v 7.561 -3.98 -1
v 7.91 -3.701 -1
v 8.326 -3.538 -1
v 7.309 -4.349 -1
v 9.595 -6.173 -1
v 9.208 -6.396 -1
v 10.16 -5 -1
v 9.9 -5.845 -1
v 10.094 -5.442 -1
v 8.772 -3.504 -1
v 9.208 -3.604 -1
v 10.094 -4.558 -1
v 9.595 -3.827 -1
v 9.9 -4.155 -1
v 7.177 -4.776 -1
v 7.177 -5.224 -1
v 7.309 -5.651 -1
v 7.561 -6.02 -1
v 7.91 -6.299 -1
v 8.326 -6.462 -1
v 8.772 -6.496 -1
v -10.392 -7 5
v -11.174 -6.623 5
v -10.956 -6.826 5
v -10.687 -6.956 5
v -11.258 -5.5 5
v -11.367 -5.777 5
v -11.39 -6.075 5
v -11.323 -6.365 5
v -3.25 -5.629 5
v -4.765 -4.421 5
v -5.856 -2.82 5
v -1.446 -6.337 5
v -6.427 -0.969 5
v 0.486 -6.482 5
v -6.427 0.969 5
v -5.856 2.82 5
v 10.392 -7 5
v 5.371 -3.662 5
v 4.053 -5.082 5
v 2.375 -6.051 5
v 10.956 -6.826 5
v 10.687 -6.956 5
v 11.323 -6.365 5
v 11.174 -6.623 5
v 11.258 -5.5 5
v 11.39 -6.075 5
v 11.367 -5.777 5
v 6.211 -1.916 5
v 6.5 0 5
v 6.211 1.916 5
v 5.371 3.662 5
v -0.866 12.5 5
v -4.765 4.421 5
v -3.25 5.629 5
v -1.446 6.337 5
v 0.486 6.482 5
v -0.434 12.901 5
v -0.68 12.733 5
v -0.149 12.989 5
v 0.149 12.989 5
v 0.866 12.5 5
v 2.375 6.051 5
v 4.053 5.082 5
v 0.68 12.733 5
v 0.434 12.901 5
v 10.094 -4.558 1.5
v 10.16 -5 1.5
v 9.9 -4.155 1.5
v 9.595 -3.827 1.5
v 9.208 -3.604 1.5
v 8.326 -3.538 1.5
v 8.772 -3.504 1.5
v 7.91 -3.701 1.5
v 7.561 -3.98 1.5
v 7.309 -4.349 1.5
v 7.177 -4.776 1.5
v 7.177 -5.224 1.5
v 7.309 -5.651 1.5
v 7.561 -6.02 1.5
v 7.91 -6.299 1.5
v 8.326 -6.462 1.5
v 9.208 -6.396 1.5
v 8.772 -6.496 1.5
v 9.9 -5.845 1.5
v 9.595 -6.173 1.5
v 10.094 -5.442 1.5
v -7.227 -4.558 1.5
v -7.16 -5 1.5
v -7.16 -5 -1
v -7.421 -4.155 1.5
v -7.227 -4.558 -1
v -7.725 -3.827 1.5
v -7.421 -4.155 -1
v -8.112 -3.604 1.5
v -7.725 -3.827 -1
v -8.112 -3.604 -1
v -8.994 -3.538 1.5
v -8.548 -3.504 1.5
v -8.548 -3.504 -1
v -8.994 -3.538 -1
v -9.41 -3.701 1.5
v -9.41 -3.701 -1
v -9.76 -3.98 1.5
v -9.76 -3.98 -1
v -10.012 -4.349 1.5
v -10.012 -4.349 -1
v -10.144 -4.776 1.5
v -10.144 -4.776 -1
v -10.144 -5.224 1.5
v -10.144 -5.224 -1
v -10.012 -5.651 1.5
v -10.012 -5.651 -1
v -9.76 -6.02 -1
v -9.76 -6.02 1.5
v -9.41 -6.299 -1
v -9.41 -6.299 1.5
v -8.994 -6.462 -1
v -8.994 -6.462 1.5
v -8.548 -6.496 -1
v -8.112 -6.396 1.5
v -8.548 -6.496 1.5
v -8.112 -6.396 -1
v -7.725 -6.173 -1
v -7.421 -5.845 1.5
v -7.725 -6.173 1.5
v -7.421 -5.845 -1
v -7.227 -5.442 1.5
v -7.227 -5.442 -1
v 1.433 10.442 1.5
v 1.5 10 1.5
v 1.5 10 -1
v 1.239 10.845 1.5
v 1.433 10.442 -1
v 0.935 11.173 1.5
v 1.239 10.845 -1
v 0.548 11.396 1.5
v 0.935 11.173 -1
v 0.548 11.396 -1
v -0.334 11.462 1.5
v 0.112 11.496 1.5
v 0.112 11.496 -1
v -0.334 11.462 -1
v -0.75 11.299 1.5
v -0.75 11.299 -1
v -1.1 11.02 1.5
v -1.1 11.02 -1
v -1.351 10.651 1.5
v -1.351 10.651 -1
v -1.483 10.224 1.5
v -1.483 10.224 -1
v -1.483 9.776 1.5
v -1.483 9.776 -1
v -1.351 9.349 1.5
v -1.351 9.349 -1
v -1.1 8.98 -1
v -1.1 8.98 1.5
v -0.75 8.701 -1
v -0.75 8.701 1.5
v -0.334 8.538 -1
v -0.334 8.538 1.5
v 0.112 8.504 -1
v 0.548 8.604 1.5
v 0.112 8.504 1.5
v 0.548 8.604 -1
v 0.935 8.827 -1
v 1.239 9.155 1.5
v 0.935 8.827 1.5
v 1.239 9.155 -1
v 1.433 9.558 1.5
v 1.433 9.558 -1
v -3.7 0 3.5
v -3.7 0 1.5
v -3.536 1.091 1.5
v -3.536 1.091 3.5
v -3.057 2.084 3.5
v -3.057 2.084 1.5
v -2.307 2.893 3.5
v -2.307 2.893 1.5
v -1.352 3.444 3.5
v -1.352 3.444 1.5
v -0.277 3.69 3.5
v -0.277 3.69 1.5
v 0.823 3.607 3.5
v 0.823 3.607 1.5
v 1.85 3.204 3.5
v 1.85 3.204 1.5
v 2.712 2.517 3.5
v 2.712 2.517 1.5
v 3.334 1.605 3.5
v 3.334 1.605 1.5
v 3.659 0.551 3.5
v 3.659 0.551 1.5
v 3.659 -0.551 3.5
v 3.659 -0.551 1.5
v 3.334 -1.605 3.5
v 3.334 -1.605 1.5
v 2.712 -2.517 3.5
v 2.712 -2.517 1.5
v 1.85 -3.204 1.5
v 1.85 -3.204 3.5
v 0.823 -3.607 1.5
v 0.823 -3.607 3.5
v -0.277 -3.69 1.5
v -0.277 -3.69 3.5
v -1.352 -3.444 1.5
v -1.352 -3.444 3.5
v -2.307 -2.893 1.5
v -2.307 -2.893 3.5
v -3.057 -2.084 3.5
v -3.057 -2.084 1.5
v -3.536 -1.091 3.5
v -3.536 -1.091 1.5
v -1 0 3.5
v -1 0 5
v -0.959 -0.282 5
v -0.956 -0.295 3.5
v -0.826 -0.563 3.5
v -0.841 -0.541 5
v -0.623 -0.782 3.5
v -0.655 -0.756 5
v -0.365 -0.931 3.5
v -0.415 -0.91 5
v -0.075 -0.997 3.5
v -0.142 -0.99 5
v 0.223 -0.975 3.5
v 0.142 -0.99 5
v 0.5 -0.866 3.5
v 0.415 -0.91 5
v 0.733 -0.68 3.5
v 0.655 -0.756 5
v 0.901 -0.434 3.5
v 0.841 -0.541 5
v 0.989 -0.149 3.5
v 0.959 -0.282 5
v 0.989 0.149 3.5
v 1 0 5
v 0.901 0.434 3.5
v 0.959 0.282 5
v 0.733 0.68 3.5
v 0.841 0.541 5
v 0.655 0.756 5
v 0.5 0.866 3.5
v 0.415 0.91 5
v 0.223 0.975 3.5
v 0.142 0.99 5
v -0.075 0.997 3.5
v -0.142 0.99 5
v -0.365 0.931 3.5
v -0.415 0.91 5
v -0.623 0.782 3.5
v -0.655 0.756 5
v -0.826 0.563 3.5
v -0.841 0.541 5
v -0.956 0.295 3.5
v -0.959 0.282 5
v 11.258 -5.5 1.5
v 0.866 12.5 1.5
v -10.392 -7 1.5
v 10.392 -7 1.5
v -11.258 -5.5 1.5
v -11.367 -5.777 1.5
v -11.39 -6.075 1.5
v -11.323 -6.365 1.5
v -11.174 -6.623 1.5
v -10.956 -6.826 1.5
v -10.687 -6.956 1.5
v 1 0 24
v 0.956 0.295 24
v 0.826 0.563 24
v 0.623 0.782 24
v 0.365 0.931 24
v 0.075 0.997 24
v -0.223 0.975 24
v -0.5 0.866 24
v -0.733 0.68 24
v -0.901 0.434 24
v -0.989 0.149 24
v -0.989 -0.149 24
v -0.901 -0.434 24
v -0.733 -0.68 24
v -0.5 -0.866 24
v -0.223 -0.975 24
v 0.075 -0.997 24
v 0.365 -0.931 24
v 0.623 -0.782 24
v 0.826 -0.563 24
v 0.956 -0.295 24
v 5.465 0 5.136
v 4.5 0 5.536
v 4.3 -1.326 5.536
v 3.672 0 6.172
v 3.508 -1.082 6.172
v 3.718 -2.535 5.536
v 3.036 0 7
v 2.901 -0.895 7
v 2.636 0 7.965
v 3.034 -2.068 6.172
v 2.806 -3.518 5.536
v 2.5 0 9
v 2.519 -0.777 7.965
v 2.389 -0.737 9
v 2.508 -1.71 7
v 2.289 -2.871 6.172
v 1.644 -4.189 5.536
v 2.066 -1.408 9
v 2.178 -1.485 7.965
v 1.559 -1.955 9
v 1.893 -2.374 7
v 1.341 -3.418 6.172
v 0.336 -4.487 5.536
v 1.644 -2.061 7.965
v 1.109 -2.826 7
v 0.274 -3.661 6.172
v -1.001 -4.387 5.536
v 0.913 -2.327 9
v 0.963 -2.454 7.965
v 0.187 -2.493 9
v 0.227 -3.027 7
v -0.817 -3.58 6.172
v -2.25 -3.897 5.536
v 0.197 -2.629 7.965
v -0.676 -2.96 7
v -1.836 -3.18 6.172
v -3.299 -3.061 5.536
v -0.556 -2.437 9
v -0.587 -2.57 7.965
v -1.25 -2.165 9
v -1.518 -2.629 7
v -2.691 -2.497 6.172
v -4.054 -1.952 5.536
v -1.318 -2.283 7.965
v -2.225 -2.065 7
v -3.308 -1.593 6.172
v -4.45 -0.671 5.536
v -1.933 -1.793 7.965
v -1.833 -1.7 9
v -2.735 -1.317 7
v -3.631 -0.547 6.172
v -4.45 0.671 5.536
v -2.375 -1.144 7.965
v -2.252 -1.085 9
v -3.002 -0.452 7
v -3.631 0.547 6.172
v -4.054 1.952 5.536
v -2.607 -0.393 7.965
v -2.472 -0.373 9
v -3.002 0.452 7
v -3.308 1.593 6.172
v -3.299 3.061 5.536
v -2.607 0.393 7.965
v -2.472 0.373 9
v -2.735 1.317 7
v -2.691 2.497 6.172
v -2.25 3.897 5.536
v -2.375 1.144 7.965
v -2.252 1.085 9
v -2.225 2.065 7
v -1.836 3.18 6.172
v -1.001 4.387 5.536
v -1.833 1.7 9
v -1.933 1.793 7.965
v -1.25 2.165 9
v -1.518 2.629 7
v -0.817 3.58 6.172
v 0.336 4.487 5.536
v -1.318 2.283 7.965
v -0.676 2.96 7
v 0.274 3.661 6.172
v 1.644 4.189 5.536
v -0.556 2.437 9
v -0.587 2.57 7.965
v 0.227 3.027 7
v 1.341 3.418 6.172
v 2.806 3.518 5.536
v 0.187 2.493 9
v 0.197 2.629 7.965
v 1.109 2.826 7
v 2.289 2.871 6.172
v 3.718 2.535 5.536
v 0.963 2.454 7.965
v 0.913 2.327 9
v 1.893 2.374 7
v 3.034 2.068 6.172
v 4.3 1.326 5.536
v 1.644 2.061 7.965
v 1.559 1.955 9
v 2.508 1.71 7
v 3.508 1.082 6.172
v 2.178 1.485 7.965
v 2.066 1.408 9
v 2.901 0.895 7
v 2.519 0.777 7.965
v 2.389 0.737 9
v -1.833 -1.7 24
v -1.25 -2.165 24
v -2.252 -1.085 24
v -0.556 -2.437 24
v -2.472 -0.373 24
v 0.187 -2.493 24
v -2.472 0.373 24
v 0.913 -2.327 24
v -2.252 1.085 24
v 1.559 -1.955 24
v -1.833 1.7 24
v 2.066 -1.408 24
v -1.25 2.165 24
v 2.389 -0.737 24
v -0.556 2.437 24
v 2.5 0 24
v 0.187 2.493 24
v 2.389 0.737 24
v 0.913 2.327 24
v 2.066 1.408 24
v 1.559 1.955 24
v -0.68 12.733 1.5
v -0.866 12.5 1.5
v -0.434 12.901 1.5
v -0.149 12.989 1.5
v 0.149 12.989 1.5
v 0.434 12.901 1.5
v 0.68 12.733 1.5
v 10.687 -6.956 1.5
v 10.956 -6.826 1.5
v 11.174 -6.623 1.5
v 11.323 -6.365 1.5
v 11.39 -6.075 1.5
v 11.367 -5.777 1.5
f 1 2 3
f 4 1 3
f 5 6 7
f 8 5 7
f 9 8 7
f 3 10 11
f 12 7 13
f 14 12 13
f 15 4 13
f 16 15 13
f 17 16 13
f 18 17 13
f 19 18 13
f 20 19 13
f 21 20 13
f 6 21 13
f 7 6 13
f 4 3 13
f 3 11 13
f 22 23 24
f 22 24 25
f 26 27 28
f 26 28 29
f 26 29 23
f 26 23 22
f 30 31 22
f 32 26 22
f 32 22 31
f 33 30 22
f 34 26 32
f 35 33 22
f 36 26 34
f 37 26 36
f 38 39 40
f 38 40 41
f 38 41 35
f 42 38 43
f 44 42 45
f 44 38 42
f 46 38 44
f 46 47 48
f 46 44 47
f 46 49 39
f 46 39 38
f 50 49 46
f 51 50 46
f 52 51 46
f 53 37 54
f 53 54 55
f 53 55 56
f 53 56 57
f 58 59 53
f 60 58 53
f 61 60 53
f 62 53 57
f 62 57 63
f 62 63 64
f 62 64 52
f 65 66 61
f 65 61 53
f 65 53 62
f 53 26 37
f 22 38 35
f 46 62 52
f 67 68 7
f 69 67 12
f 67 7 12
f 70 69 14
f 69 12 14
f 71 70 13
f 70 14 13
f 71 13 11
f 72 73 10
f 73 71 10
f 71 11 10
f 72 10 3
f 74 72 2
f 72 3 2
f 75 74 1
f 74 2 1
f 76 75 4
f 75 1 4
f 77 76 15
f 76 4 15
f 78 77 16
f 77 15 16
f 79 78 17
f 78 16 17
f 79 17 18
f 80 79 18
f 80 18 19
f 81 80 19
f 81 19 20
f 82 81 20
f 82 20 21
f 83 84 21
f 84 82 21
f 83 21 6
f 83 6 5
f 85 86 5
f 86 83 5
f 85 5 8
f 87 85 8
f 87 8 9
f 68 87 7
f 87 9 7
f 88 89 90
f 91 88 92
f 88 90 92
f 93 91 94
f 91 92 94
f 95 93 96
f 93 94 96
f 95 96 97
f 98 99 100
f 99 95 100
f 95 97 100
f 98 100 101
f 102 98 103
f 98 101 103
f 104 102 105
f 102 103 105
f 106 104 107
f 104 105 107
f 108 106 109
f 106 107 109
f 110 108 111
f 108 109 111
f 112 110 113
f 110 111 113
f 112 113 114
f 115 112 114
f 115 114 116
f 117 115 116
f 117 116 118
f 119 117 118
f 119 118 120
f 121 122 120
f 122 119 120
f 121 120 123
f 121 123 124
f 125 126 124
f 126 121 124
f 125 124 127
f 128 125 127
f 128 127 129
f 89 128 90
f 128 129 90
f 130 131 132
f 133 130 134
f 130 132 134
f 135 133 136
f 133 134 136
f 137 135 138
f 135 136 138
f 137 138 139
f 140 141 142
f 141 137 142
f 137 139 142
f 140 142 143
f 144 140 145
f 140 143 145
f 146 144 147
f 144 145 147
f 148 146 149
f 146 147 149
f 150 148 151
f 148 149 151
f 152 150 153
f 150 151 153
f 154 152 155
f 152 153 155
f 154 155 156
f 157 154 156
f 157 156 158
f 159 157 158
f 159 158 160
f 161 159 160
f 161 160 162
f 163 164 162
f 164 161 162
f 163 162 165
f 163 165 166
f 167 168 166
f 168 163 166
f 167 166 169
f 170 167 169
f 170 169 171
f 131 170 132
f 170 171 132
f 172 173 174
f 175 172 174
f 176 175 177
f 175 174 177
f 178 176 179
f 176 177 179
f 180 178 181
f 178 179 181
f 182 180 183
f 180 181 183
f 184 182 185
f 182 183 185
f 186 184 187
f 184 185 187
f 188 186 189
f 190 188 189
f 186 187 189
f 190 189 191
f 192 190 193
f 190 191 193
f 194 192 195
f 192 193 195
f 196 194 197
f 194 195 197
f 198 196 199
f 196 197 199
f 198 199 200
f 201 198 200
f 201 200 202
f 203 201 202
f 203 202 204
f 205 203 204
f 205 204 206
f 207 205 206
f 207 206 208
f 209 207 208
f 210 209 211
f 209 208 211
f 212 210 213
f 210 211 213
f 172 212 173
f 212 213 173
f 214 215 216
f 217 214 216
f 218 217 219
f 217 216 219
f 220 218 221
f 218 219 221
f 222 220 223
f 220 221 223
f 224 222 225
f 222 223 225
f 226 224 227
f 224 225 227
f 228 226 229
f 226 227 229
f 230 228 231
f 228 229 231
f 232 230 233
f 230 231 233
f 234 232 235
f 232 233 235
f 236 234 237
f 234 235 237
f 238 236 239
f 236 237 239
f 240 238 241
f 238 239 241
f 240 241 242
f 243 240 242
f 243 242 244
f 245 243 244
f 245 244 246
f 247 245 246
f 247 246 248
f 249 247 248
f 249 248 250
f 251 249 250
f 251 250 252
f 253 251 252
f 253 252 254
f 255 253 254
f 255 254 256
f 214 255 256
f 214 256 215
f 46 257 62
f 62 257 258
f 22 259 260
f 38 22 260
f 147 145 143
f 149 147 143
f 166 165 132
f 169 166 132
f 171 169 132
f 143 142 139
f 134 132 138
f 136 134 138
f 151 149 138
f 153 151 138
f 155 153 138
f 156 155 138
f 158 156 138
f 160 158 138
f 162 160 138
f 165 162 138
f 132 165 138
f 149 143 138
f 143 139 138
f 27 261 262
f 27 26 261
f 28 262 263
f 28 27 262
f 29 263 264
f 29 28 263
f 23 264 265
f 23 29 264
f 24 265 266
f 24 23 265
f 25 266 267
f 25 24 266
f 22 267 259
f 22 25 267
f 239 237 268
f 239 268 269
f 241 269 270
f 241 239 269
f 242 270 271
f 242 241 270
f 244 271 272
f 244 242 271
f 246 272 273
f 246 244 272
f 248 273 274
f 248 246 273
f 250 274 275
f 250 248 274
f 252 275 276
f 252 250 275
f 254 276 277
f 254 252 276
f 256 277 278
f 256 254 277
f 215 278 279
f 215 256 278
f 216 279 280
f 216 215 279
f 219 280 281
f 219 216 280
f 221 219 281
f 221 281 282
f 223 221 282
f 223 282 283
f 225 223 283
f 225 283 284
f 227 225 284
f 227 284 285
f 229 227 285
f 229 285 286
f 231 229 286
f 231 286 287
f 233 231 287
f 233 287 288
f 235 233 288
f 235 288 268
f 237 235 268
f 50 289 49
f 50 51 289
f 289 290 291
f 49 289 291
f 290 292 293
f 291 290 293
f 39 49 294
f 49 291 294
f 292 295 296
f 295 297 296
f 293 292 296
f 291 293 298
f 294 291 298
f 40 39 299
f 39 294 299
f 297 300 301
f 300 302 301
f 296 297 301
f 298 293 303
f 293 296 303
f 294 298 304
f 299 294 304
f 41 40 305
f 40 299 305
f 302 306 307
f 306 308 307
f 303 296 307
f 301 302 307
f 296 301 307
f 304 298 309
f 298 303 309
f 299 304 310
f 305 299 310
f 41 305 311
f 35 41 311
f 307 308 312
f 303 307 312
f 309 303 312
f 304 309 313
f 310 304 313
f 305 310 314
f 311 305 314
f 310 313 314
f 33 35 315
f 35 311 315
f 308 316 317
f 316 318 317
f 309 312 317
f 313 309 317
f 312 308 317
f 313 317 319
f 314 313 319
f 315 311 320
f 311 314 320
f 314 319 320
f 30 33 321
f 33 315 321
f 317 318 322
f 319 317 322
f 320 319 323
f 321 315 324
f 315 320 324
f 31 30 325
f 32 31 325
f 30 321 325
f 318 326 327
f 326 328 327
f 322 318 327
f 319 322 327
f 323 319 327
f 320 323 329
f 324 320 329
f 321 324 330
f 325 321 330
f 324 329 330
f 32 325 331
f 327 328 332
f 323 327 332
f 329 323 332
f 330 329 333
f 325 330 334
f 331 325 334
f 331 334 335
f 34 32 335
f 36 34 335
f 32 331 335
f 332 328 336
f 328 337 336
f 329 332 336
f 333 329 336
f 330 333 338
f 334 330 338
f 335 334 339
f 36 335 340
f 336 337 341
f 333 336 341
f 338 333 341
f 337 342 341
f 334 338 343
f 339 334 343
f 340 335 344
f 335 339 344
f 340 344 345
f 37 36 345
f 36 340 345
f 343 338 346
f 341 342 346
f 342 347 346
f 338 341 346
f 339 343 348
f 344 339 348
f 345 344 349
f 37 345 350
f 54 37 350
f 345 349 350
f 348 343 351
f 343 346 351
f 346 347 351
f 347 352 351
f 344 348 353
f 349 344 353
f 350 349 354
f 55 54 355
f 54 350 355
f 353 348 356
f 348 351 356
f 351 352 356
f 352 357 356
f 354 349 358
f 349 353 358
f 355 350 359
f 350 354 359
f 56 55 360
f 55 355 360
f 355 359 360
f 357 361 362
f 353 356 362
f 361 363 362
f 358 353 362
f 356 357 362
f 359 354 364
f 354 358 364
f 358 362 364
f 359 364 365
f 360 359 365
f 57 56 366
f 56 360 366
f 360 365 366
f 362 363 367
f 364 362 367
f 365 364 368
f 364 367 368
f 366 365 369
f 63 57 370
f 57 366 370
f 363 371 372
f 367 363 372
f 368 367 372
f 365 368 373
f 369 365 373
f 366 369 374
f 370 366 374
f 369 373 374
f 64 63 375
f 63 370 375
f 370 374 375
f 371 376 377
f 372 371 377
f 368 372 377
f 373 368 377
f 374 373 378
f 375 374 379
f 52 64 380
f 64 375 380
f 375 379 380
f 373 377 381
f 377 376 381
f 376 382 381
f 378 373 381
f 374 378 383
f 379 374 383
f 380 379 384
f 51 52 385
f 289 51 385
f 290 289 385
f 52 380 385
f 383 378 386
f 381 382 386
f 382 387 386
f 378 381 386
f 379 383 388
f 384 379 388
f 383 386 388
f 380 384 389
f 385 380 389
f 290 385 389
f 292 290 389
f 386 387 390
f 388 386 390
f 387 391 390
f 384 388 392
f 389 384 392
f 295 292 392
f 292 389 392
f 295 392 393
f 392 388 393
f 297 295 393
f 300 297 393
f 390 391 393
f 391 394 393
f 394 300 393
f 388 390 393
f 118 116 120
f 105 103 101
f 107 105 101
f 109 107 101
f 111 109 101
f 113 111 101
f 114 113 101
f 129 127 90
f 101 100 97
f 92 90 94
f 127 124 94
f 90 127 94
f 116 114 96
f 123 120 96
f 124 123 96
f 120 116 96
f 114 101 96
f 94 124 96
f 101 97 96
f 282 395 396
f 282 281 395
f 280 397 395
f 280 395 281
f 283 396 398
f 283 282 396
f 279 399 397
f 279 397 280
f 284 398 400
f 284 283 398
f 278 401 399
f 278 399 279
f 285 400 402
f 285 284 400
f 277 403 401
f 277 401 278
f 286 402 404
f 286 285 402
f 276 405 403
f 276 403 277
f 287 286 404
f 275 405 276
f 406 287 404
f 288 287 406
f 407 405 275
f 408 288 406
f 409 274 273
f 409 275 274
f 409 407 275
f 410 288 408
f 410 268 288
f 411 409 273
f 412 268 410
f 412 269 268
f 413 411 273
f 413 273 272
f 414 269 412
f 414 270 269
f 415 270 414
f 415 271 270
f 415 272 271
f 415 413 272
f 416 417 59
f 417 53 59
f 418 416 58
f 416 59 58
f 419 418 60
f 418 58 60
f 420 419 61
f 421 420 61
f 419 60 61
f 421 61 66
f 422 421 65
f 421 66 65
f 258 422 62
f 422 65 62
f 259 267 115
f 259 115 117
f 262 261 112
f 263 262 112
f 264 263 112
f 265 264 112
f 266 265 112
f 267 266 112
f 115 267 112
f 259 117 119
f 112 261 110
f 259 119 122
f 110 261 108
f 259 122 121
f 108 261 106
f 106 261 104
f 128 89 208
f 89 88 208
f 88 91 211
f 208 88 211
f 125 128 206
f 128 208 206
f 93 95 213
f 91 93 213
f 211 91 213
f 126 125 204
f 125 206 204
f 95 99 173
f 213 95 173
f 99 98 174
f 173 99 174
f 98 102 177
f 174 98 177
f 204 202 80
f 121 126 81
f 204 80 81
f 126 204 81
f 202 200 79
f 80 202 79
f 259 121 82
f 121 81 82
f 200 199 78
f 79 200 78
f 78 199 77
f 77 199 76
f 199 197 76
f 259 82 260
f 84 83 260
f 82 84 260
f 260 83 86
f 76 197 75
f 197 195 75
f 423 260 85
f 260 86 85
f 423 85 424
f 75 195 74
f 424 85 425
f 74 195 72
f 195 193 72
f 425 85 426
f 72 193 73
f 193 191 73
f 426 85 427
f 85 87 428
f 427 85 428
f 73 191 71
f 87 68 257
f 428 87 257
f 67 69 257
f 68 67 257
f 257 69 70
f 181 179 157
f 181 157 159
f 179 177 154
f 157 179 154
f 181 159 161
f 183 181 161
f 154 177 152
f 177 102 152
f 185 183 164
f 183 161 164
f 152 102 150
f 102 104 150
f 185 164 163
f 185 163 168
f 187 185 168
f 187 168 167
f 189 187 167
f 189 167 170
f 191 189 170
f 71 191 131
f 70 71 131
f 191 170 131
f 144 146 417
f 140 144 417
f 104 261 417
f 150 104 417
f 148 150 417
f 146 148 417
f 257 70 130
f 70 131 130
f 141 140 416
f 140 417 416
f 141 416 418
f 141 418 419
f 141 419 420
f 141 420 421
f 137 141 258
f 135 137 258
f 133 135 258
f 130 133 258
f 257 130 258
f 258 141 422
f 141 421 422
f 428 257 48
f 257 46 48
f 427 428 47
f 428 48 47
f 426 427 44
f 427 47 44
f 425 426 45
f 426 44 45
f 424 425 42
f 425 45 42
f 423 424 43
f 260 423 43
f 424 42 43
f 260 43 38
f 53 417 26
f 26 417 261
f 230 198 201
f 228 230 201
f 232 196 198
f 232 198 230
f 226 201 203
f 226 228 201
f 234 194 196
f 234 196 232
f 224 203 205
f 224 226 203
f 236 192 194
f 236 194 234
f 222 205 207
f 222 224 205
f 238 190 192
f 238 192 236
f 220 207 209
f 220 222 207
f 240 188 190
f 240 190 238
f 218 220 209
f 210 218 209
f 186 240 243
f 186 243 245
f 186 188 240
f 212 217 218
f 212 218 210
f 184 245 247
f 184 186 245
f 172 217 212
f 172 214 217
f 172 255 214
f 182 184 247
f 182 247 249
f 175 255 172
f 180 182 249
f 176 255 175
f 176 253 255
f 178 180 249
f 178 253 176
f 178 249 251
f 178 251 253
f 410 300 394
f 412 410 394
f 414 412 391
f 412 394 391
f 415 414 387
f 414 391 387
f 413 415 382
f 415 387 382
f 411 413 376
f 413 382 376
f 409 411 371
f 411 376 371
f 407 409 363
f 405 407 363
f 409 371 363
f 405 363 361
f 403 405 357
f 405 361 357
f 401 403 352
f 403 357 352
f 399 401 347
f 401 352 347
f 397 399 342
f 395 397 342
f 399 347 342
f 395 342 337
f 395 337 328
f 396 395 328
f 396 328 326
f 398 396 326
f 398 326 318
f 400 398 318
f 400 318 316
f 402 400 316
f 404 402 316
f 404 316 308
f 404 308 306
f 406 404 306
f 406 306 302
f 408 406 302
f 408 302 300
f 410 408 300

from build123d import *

# Parameters (mm, degrees)
SKETCH_1_R             = 2.5
SKETCH_1_R_2           = 1
EXTRUDE_2_DEPTH        = 24
EXTRUDE_3_DEPTH        = 2
EXTRUDE_3_DEPTH_BACK   = 1
SKETCH_3_R             = 1.5
EXTRUDE_3_2_DEPTH      = 2
EXTRUDE_3_2_DEPTH_BACK = 1
EXTRUDE_3_3_DEPTH      = 2
EXTRUDE_3_3_DEPTH_BACK = 1
SKETCH_4_R             = 2.23
CUT_EXTRUDE_1_DEPTH    = 2
EXTRUDE_6_DEPTH        = 3
EXTRUDE_6_DEPTH_BACK   = 0.5
SKETCH_10_R            = 2.35
SKETCH_10_R_2          = 2.23
CUT_EXTRUDE_2_DEPTH    = 1
SKETCH_11_R            = 3.7
CUT_EXTRUDE_3_DEPTH    = 2
SKETCH_12_R            = 1
CUT_EXTRUDE_4_DEPTH    = 27.532998323
FILLET_5_R             = 1
FILLET_6_R             = 4
SKETCH_14_R            = 2.75
SKETCH_14_R_2          = 2.23
CUT_EXTRUDE_5_DEPTH    = 2


with BuildPart() as part:
    # ｽｹｯﾁ1 → ﾎﾞｽ - 押し出し2 (new body)
    with BuildSketch(Plane.XY):
        Circle(SKETCH_1_R)
        Circle(SKETCH_1_R_2, mode=Mode.SUBTRACT)
    extrude(amount=EXTRUDE_2_DEPTH)

    # ｽｹｯﾁ4 → ｶｯﾄ - 押し出し1 (cut)
    with BuildSketch(Plane(origin=(0, 0, 0), x_dir=(-1, 0, 0), z_dir=(0, 0, -1))):
        Circle(SKETCH_4_R)
    extrude(amount=-CUT_EXTRUDE_1_DEPTH, mode=Mode.SUBTRACT)



with BuildPart() as body_2:
    # ｽｹｯﾁ3 → ﾎﾞｽ - 押し出し3 (new, two sides: drawn at the far end of the back side and taken through both)
    with BuildSketch(Plane.XY.offset(-EXTRUDE_3_DEPTH_BACK)):
        with Locations((0, 10)):
            Circle(SKETCH_3_R)
    extrude(amount=EXTRUDE_3_DEPTH + EXTRUDE_3_DEPTH_BACK)


with BuildPart() as body_3:
    # ｽｹｯﾁ3 → Extrude 3 2 (new, two sides: drawn at the far end of the back side and taken through both)
    with BuildSketch(Plane.XY.offset(-EXTRUDE_3_2_DEPTH_BACK)):
        with Locations((8.660254038, -5)):
            Circle(SKETCH_3_R)
    extrude(amount=EXTRUDE_3_2_DEPTH + EXTRUDE_3_2_DEPTH_BACK)


with BuildPart() as body_4:
    # ｽｹｯﾁ3 → Extrude 3 3 (new, two sides: drawn at the far end of the back side and taken through both)
    with BuildSketch(Plane.XY.offset(-EXTRUDE_3_3_DEPTH_BACK)):
        with Locations((-8.660254038, -5)):
            Circle(SKETCH_3_R)
    extrude(amount=EXTRUDE_3_3_DEPTH + EXTRUDE_3_3_DEPTH_BACK)


with BuildPart() as part_1:
    add(part.part)

    add(body_2.part)  # ﾎﾞｽ - 押し出し6 merges body 2

    add(body_3.part)  # ﾎﾞｽ - 押し出し6 merges body 3

    add(body_4.part)  # ﾎﾞｽ - 押し出し6 merges body 4
    # ｽｹｯﾁ5 → ﾎﾞｽ - 押し出し6 (add, two sides: drawn at the far end of the back side and taken through both)
    with BuildSketch(Plane.XY.offset(2).offset(-EXTRUDE_6_DEPTH_BACK)):
        Polygon((0, 14), (-12.124355653, -7), (12.124355653, -7), align=None)
    extrude(amount=EXTRUDE_6_DEPTH + EXTRUDE_6_DEPTH_BACK)

    # ｽｹｯﾁ10 → ｶｯﾄ - 押し出し2 (cut)
    with BuildSketch(Plane(origin=(0, 0, 0), x_dir=(-1, 0, 0), z_dir=(0, 0, -1))):
        Circle(SKETCH_10_R)
        Circle(SKETCH_10_R_2, mode=Mode.SUBTRACT)
    extrude(amount=-CUT_EXTRUDE_2_DEPTH, mode=Mode.SUBTRACT)

    # ｽｹｯﾁ11 → ｶｯﾄ - 押し出し3 (cut)
    with BuildSketch(Plane(origin=(0, 0, 1.5), x_dir=(-1, 0, 0), z_dir=(0, 0, -1))):
        Circle(SKETCH_11_R)
    extrude(amount=-CUT_EXTRUDE_3_DEPTH, mode=Mode.SUBTRACT)


with BuildPart() as cut_extrude_3_piece_1:
    # of the separate pieces the step leaves, piece 1, a body of its own (cut_extrude_3_pieces)
    add(part_1.part.solids().sort_by_distance((0, 14, 1.5))[0])

    # ｽｹｯﾁ12 → ｶｯﾄ - 押し出し4 (cut, through all)
    with BuildSketch(Plane.XY.offset(5)):
        with Locations(Location((0, 0, 0), (0, 0, 180))):
            Circle(SKETCH_12_R)
    extrude(amount=-CUT_EXTRUDE_4_DEPTH, mode=Mode.SUBTRACT)

    # ﾌｨﾚｯﾄ5
    fillet_5_edges = [cut_extrude_3_piece_1.edges().sort_by_distance(p)[0] for p in [
        (0, 14, 3.25),
        (12.124355653, -7, 3.25),
        (-12.124355653, -7, 3.25),
    ]]
    fillet(fillet_5_edges, radius=FILLET_5_R)

    # ﾌｨﾚｯﾄ6
    fillet_6_edges = [cut_extrude_3_piece_1.edges().sort_by_distance(p)[0] for p in [
        (-2.5, 0, 5),
    ]]
    fillet(fillet_6_edges, radius=FILLET_6_R)


with BuildPart() as cut_extrude_3_piece_2:
    # of the separate pieces the step leaves, piece 2, a body of its own (cut_extrude_3_pieces)
    add(part_1.part.solids().sort_by_distance((2.5, 0, 0))[0])

    # ｽｹｯﾁ14 → ｶｯﾄ - 押し出し5 (cut)
    with BuildSketch(Plane(origin=(0, 0, 0), x_dir=(-1, 0, 0), z_dir=(0, 0, -1))):
        Circle(SKETCH_14_R)
        Circle(SKETCH_14_R_2, mode=Mode.SUBTRACT)
    extrude(amount=-CUT_EXTRUDE_5_DEPTH, mode=Mode.SUBTRACT)


solid = cut_extrude_3_piece_1.part
